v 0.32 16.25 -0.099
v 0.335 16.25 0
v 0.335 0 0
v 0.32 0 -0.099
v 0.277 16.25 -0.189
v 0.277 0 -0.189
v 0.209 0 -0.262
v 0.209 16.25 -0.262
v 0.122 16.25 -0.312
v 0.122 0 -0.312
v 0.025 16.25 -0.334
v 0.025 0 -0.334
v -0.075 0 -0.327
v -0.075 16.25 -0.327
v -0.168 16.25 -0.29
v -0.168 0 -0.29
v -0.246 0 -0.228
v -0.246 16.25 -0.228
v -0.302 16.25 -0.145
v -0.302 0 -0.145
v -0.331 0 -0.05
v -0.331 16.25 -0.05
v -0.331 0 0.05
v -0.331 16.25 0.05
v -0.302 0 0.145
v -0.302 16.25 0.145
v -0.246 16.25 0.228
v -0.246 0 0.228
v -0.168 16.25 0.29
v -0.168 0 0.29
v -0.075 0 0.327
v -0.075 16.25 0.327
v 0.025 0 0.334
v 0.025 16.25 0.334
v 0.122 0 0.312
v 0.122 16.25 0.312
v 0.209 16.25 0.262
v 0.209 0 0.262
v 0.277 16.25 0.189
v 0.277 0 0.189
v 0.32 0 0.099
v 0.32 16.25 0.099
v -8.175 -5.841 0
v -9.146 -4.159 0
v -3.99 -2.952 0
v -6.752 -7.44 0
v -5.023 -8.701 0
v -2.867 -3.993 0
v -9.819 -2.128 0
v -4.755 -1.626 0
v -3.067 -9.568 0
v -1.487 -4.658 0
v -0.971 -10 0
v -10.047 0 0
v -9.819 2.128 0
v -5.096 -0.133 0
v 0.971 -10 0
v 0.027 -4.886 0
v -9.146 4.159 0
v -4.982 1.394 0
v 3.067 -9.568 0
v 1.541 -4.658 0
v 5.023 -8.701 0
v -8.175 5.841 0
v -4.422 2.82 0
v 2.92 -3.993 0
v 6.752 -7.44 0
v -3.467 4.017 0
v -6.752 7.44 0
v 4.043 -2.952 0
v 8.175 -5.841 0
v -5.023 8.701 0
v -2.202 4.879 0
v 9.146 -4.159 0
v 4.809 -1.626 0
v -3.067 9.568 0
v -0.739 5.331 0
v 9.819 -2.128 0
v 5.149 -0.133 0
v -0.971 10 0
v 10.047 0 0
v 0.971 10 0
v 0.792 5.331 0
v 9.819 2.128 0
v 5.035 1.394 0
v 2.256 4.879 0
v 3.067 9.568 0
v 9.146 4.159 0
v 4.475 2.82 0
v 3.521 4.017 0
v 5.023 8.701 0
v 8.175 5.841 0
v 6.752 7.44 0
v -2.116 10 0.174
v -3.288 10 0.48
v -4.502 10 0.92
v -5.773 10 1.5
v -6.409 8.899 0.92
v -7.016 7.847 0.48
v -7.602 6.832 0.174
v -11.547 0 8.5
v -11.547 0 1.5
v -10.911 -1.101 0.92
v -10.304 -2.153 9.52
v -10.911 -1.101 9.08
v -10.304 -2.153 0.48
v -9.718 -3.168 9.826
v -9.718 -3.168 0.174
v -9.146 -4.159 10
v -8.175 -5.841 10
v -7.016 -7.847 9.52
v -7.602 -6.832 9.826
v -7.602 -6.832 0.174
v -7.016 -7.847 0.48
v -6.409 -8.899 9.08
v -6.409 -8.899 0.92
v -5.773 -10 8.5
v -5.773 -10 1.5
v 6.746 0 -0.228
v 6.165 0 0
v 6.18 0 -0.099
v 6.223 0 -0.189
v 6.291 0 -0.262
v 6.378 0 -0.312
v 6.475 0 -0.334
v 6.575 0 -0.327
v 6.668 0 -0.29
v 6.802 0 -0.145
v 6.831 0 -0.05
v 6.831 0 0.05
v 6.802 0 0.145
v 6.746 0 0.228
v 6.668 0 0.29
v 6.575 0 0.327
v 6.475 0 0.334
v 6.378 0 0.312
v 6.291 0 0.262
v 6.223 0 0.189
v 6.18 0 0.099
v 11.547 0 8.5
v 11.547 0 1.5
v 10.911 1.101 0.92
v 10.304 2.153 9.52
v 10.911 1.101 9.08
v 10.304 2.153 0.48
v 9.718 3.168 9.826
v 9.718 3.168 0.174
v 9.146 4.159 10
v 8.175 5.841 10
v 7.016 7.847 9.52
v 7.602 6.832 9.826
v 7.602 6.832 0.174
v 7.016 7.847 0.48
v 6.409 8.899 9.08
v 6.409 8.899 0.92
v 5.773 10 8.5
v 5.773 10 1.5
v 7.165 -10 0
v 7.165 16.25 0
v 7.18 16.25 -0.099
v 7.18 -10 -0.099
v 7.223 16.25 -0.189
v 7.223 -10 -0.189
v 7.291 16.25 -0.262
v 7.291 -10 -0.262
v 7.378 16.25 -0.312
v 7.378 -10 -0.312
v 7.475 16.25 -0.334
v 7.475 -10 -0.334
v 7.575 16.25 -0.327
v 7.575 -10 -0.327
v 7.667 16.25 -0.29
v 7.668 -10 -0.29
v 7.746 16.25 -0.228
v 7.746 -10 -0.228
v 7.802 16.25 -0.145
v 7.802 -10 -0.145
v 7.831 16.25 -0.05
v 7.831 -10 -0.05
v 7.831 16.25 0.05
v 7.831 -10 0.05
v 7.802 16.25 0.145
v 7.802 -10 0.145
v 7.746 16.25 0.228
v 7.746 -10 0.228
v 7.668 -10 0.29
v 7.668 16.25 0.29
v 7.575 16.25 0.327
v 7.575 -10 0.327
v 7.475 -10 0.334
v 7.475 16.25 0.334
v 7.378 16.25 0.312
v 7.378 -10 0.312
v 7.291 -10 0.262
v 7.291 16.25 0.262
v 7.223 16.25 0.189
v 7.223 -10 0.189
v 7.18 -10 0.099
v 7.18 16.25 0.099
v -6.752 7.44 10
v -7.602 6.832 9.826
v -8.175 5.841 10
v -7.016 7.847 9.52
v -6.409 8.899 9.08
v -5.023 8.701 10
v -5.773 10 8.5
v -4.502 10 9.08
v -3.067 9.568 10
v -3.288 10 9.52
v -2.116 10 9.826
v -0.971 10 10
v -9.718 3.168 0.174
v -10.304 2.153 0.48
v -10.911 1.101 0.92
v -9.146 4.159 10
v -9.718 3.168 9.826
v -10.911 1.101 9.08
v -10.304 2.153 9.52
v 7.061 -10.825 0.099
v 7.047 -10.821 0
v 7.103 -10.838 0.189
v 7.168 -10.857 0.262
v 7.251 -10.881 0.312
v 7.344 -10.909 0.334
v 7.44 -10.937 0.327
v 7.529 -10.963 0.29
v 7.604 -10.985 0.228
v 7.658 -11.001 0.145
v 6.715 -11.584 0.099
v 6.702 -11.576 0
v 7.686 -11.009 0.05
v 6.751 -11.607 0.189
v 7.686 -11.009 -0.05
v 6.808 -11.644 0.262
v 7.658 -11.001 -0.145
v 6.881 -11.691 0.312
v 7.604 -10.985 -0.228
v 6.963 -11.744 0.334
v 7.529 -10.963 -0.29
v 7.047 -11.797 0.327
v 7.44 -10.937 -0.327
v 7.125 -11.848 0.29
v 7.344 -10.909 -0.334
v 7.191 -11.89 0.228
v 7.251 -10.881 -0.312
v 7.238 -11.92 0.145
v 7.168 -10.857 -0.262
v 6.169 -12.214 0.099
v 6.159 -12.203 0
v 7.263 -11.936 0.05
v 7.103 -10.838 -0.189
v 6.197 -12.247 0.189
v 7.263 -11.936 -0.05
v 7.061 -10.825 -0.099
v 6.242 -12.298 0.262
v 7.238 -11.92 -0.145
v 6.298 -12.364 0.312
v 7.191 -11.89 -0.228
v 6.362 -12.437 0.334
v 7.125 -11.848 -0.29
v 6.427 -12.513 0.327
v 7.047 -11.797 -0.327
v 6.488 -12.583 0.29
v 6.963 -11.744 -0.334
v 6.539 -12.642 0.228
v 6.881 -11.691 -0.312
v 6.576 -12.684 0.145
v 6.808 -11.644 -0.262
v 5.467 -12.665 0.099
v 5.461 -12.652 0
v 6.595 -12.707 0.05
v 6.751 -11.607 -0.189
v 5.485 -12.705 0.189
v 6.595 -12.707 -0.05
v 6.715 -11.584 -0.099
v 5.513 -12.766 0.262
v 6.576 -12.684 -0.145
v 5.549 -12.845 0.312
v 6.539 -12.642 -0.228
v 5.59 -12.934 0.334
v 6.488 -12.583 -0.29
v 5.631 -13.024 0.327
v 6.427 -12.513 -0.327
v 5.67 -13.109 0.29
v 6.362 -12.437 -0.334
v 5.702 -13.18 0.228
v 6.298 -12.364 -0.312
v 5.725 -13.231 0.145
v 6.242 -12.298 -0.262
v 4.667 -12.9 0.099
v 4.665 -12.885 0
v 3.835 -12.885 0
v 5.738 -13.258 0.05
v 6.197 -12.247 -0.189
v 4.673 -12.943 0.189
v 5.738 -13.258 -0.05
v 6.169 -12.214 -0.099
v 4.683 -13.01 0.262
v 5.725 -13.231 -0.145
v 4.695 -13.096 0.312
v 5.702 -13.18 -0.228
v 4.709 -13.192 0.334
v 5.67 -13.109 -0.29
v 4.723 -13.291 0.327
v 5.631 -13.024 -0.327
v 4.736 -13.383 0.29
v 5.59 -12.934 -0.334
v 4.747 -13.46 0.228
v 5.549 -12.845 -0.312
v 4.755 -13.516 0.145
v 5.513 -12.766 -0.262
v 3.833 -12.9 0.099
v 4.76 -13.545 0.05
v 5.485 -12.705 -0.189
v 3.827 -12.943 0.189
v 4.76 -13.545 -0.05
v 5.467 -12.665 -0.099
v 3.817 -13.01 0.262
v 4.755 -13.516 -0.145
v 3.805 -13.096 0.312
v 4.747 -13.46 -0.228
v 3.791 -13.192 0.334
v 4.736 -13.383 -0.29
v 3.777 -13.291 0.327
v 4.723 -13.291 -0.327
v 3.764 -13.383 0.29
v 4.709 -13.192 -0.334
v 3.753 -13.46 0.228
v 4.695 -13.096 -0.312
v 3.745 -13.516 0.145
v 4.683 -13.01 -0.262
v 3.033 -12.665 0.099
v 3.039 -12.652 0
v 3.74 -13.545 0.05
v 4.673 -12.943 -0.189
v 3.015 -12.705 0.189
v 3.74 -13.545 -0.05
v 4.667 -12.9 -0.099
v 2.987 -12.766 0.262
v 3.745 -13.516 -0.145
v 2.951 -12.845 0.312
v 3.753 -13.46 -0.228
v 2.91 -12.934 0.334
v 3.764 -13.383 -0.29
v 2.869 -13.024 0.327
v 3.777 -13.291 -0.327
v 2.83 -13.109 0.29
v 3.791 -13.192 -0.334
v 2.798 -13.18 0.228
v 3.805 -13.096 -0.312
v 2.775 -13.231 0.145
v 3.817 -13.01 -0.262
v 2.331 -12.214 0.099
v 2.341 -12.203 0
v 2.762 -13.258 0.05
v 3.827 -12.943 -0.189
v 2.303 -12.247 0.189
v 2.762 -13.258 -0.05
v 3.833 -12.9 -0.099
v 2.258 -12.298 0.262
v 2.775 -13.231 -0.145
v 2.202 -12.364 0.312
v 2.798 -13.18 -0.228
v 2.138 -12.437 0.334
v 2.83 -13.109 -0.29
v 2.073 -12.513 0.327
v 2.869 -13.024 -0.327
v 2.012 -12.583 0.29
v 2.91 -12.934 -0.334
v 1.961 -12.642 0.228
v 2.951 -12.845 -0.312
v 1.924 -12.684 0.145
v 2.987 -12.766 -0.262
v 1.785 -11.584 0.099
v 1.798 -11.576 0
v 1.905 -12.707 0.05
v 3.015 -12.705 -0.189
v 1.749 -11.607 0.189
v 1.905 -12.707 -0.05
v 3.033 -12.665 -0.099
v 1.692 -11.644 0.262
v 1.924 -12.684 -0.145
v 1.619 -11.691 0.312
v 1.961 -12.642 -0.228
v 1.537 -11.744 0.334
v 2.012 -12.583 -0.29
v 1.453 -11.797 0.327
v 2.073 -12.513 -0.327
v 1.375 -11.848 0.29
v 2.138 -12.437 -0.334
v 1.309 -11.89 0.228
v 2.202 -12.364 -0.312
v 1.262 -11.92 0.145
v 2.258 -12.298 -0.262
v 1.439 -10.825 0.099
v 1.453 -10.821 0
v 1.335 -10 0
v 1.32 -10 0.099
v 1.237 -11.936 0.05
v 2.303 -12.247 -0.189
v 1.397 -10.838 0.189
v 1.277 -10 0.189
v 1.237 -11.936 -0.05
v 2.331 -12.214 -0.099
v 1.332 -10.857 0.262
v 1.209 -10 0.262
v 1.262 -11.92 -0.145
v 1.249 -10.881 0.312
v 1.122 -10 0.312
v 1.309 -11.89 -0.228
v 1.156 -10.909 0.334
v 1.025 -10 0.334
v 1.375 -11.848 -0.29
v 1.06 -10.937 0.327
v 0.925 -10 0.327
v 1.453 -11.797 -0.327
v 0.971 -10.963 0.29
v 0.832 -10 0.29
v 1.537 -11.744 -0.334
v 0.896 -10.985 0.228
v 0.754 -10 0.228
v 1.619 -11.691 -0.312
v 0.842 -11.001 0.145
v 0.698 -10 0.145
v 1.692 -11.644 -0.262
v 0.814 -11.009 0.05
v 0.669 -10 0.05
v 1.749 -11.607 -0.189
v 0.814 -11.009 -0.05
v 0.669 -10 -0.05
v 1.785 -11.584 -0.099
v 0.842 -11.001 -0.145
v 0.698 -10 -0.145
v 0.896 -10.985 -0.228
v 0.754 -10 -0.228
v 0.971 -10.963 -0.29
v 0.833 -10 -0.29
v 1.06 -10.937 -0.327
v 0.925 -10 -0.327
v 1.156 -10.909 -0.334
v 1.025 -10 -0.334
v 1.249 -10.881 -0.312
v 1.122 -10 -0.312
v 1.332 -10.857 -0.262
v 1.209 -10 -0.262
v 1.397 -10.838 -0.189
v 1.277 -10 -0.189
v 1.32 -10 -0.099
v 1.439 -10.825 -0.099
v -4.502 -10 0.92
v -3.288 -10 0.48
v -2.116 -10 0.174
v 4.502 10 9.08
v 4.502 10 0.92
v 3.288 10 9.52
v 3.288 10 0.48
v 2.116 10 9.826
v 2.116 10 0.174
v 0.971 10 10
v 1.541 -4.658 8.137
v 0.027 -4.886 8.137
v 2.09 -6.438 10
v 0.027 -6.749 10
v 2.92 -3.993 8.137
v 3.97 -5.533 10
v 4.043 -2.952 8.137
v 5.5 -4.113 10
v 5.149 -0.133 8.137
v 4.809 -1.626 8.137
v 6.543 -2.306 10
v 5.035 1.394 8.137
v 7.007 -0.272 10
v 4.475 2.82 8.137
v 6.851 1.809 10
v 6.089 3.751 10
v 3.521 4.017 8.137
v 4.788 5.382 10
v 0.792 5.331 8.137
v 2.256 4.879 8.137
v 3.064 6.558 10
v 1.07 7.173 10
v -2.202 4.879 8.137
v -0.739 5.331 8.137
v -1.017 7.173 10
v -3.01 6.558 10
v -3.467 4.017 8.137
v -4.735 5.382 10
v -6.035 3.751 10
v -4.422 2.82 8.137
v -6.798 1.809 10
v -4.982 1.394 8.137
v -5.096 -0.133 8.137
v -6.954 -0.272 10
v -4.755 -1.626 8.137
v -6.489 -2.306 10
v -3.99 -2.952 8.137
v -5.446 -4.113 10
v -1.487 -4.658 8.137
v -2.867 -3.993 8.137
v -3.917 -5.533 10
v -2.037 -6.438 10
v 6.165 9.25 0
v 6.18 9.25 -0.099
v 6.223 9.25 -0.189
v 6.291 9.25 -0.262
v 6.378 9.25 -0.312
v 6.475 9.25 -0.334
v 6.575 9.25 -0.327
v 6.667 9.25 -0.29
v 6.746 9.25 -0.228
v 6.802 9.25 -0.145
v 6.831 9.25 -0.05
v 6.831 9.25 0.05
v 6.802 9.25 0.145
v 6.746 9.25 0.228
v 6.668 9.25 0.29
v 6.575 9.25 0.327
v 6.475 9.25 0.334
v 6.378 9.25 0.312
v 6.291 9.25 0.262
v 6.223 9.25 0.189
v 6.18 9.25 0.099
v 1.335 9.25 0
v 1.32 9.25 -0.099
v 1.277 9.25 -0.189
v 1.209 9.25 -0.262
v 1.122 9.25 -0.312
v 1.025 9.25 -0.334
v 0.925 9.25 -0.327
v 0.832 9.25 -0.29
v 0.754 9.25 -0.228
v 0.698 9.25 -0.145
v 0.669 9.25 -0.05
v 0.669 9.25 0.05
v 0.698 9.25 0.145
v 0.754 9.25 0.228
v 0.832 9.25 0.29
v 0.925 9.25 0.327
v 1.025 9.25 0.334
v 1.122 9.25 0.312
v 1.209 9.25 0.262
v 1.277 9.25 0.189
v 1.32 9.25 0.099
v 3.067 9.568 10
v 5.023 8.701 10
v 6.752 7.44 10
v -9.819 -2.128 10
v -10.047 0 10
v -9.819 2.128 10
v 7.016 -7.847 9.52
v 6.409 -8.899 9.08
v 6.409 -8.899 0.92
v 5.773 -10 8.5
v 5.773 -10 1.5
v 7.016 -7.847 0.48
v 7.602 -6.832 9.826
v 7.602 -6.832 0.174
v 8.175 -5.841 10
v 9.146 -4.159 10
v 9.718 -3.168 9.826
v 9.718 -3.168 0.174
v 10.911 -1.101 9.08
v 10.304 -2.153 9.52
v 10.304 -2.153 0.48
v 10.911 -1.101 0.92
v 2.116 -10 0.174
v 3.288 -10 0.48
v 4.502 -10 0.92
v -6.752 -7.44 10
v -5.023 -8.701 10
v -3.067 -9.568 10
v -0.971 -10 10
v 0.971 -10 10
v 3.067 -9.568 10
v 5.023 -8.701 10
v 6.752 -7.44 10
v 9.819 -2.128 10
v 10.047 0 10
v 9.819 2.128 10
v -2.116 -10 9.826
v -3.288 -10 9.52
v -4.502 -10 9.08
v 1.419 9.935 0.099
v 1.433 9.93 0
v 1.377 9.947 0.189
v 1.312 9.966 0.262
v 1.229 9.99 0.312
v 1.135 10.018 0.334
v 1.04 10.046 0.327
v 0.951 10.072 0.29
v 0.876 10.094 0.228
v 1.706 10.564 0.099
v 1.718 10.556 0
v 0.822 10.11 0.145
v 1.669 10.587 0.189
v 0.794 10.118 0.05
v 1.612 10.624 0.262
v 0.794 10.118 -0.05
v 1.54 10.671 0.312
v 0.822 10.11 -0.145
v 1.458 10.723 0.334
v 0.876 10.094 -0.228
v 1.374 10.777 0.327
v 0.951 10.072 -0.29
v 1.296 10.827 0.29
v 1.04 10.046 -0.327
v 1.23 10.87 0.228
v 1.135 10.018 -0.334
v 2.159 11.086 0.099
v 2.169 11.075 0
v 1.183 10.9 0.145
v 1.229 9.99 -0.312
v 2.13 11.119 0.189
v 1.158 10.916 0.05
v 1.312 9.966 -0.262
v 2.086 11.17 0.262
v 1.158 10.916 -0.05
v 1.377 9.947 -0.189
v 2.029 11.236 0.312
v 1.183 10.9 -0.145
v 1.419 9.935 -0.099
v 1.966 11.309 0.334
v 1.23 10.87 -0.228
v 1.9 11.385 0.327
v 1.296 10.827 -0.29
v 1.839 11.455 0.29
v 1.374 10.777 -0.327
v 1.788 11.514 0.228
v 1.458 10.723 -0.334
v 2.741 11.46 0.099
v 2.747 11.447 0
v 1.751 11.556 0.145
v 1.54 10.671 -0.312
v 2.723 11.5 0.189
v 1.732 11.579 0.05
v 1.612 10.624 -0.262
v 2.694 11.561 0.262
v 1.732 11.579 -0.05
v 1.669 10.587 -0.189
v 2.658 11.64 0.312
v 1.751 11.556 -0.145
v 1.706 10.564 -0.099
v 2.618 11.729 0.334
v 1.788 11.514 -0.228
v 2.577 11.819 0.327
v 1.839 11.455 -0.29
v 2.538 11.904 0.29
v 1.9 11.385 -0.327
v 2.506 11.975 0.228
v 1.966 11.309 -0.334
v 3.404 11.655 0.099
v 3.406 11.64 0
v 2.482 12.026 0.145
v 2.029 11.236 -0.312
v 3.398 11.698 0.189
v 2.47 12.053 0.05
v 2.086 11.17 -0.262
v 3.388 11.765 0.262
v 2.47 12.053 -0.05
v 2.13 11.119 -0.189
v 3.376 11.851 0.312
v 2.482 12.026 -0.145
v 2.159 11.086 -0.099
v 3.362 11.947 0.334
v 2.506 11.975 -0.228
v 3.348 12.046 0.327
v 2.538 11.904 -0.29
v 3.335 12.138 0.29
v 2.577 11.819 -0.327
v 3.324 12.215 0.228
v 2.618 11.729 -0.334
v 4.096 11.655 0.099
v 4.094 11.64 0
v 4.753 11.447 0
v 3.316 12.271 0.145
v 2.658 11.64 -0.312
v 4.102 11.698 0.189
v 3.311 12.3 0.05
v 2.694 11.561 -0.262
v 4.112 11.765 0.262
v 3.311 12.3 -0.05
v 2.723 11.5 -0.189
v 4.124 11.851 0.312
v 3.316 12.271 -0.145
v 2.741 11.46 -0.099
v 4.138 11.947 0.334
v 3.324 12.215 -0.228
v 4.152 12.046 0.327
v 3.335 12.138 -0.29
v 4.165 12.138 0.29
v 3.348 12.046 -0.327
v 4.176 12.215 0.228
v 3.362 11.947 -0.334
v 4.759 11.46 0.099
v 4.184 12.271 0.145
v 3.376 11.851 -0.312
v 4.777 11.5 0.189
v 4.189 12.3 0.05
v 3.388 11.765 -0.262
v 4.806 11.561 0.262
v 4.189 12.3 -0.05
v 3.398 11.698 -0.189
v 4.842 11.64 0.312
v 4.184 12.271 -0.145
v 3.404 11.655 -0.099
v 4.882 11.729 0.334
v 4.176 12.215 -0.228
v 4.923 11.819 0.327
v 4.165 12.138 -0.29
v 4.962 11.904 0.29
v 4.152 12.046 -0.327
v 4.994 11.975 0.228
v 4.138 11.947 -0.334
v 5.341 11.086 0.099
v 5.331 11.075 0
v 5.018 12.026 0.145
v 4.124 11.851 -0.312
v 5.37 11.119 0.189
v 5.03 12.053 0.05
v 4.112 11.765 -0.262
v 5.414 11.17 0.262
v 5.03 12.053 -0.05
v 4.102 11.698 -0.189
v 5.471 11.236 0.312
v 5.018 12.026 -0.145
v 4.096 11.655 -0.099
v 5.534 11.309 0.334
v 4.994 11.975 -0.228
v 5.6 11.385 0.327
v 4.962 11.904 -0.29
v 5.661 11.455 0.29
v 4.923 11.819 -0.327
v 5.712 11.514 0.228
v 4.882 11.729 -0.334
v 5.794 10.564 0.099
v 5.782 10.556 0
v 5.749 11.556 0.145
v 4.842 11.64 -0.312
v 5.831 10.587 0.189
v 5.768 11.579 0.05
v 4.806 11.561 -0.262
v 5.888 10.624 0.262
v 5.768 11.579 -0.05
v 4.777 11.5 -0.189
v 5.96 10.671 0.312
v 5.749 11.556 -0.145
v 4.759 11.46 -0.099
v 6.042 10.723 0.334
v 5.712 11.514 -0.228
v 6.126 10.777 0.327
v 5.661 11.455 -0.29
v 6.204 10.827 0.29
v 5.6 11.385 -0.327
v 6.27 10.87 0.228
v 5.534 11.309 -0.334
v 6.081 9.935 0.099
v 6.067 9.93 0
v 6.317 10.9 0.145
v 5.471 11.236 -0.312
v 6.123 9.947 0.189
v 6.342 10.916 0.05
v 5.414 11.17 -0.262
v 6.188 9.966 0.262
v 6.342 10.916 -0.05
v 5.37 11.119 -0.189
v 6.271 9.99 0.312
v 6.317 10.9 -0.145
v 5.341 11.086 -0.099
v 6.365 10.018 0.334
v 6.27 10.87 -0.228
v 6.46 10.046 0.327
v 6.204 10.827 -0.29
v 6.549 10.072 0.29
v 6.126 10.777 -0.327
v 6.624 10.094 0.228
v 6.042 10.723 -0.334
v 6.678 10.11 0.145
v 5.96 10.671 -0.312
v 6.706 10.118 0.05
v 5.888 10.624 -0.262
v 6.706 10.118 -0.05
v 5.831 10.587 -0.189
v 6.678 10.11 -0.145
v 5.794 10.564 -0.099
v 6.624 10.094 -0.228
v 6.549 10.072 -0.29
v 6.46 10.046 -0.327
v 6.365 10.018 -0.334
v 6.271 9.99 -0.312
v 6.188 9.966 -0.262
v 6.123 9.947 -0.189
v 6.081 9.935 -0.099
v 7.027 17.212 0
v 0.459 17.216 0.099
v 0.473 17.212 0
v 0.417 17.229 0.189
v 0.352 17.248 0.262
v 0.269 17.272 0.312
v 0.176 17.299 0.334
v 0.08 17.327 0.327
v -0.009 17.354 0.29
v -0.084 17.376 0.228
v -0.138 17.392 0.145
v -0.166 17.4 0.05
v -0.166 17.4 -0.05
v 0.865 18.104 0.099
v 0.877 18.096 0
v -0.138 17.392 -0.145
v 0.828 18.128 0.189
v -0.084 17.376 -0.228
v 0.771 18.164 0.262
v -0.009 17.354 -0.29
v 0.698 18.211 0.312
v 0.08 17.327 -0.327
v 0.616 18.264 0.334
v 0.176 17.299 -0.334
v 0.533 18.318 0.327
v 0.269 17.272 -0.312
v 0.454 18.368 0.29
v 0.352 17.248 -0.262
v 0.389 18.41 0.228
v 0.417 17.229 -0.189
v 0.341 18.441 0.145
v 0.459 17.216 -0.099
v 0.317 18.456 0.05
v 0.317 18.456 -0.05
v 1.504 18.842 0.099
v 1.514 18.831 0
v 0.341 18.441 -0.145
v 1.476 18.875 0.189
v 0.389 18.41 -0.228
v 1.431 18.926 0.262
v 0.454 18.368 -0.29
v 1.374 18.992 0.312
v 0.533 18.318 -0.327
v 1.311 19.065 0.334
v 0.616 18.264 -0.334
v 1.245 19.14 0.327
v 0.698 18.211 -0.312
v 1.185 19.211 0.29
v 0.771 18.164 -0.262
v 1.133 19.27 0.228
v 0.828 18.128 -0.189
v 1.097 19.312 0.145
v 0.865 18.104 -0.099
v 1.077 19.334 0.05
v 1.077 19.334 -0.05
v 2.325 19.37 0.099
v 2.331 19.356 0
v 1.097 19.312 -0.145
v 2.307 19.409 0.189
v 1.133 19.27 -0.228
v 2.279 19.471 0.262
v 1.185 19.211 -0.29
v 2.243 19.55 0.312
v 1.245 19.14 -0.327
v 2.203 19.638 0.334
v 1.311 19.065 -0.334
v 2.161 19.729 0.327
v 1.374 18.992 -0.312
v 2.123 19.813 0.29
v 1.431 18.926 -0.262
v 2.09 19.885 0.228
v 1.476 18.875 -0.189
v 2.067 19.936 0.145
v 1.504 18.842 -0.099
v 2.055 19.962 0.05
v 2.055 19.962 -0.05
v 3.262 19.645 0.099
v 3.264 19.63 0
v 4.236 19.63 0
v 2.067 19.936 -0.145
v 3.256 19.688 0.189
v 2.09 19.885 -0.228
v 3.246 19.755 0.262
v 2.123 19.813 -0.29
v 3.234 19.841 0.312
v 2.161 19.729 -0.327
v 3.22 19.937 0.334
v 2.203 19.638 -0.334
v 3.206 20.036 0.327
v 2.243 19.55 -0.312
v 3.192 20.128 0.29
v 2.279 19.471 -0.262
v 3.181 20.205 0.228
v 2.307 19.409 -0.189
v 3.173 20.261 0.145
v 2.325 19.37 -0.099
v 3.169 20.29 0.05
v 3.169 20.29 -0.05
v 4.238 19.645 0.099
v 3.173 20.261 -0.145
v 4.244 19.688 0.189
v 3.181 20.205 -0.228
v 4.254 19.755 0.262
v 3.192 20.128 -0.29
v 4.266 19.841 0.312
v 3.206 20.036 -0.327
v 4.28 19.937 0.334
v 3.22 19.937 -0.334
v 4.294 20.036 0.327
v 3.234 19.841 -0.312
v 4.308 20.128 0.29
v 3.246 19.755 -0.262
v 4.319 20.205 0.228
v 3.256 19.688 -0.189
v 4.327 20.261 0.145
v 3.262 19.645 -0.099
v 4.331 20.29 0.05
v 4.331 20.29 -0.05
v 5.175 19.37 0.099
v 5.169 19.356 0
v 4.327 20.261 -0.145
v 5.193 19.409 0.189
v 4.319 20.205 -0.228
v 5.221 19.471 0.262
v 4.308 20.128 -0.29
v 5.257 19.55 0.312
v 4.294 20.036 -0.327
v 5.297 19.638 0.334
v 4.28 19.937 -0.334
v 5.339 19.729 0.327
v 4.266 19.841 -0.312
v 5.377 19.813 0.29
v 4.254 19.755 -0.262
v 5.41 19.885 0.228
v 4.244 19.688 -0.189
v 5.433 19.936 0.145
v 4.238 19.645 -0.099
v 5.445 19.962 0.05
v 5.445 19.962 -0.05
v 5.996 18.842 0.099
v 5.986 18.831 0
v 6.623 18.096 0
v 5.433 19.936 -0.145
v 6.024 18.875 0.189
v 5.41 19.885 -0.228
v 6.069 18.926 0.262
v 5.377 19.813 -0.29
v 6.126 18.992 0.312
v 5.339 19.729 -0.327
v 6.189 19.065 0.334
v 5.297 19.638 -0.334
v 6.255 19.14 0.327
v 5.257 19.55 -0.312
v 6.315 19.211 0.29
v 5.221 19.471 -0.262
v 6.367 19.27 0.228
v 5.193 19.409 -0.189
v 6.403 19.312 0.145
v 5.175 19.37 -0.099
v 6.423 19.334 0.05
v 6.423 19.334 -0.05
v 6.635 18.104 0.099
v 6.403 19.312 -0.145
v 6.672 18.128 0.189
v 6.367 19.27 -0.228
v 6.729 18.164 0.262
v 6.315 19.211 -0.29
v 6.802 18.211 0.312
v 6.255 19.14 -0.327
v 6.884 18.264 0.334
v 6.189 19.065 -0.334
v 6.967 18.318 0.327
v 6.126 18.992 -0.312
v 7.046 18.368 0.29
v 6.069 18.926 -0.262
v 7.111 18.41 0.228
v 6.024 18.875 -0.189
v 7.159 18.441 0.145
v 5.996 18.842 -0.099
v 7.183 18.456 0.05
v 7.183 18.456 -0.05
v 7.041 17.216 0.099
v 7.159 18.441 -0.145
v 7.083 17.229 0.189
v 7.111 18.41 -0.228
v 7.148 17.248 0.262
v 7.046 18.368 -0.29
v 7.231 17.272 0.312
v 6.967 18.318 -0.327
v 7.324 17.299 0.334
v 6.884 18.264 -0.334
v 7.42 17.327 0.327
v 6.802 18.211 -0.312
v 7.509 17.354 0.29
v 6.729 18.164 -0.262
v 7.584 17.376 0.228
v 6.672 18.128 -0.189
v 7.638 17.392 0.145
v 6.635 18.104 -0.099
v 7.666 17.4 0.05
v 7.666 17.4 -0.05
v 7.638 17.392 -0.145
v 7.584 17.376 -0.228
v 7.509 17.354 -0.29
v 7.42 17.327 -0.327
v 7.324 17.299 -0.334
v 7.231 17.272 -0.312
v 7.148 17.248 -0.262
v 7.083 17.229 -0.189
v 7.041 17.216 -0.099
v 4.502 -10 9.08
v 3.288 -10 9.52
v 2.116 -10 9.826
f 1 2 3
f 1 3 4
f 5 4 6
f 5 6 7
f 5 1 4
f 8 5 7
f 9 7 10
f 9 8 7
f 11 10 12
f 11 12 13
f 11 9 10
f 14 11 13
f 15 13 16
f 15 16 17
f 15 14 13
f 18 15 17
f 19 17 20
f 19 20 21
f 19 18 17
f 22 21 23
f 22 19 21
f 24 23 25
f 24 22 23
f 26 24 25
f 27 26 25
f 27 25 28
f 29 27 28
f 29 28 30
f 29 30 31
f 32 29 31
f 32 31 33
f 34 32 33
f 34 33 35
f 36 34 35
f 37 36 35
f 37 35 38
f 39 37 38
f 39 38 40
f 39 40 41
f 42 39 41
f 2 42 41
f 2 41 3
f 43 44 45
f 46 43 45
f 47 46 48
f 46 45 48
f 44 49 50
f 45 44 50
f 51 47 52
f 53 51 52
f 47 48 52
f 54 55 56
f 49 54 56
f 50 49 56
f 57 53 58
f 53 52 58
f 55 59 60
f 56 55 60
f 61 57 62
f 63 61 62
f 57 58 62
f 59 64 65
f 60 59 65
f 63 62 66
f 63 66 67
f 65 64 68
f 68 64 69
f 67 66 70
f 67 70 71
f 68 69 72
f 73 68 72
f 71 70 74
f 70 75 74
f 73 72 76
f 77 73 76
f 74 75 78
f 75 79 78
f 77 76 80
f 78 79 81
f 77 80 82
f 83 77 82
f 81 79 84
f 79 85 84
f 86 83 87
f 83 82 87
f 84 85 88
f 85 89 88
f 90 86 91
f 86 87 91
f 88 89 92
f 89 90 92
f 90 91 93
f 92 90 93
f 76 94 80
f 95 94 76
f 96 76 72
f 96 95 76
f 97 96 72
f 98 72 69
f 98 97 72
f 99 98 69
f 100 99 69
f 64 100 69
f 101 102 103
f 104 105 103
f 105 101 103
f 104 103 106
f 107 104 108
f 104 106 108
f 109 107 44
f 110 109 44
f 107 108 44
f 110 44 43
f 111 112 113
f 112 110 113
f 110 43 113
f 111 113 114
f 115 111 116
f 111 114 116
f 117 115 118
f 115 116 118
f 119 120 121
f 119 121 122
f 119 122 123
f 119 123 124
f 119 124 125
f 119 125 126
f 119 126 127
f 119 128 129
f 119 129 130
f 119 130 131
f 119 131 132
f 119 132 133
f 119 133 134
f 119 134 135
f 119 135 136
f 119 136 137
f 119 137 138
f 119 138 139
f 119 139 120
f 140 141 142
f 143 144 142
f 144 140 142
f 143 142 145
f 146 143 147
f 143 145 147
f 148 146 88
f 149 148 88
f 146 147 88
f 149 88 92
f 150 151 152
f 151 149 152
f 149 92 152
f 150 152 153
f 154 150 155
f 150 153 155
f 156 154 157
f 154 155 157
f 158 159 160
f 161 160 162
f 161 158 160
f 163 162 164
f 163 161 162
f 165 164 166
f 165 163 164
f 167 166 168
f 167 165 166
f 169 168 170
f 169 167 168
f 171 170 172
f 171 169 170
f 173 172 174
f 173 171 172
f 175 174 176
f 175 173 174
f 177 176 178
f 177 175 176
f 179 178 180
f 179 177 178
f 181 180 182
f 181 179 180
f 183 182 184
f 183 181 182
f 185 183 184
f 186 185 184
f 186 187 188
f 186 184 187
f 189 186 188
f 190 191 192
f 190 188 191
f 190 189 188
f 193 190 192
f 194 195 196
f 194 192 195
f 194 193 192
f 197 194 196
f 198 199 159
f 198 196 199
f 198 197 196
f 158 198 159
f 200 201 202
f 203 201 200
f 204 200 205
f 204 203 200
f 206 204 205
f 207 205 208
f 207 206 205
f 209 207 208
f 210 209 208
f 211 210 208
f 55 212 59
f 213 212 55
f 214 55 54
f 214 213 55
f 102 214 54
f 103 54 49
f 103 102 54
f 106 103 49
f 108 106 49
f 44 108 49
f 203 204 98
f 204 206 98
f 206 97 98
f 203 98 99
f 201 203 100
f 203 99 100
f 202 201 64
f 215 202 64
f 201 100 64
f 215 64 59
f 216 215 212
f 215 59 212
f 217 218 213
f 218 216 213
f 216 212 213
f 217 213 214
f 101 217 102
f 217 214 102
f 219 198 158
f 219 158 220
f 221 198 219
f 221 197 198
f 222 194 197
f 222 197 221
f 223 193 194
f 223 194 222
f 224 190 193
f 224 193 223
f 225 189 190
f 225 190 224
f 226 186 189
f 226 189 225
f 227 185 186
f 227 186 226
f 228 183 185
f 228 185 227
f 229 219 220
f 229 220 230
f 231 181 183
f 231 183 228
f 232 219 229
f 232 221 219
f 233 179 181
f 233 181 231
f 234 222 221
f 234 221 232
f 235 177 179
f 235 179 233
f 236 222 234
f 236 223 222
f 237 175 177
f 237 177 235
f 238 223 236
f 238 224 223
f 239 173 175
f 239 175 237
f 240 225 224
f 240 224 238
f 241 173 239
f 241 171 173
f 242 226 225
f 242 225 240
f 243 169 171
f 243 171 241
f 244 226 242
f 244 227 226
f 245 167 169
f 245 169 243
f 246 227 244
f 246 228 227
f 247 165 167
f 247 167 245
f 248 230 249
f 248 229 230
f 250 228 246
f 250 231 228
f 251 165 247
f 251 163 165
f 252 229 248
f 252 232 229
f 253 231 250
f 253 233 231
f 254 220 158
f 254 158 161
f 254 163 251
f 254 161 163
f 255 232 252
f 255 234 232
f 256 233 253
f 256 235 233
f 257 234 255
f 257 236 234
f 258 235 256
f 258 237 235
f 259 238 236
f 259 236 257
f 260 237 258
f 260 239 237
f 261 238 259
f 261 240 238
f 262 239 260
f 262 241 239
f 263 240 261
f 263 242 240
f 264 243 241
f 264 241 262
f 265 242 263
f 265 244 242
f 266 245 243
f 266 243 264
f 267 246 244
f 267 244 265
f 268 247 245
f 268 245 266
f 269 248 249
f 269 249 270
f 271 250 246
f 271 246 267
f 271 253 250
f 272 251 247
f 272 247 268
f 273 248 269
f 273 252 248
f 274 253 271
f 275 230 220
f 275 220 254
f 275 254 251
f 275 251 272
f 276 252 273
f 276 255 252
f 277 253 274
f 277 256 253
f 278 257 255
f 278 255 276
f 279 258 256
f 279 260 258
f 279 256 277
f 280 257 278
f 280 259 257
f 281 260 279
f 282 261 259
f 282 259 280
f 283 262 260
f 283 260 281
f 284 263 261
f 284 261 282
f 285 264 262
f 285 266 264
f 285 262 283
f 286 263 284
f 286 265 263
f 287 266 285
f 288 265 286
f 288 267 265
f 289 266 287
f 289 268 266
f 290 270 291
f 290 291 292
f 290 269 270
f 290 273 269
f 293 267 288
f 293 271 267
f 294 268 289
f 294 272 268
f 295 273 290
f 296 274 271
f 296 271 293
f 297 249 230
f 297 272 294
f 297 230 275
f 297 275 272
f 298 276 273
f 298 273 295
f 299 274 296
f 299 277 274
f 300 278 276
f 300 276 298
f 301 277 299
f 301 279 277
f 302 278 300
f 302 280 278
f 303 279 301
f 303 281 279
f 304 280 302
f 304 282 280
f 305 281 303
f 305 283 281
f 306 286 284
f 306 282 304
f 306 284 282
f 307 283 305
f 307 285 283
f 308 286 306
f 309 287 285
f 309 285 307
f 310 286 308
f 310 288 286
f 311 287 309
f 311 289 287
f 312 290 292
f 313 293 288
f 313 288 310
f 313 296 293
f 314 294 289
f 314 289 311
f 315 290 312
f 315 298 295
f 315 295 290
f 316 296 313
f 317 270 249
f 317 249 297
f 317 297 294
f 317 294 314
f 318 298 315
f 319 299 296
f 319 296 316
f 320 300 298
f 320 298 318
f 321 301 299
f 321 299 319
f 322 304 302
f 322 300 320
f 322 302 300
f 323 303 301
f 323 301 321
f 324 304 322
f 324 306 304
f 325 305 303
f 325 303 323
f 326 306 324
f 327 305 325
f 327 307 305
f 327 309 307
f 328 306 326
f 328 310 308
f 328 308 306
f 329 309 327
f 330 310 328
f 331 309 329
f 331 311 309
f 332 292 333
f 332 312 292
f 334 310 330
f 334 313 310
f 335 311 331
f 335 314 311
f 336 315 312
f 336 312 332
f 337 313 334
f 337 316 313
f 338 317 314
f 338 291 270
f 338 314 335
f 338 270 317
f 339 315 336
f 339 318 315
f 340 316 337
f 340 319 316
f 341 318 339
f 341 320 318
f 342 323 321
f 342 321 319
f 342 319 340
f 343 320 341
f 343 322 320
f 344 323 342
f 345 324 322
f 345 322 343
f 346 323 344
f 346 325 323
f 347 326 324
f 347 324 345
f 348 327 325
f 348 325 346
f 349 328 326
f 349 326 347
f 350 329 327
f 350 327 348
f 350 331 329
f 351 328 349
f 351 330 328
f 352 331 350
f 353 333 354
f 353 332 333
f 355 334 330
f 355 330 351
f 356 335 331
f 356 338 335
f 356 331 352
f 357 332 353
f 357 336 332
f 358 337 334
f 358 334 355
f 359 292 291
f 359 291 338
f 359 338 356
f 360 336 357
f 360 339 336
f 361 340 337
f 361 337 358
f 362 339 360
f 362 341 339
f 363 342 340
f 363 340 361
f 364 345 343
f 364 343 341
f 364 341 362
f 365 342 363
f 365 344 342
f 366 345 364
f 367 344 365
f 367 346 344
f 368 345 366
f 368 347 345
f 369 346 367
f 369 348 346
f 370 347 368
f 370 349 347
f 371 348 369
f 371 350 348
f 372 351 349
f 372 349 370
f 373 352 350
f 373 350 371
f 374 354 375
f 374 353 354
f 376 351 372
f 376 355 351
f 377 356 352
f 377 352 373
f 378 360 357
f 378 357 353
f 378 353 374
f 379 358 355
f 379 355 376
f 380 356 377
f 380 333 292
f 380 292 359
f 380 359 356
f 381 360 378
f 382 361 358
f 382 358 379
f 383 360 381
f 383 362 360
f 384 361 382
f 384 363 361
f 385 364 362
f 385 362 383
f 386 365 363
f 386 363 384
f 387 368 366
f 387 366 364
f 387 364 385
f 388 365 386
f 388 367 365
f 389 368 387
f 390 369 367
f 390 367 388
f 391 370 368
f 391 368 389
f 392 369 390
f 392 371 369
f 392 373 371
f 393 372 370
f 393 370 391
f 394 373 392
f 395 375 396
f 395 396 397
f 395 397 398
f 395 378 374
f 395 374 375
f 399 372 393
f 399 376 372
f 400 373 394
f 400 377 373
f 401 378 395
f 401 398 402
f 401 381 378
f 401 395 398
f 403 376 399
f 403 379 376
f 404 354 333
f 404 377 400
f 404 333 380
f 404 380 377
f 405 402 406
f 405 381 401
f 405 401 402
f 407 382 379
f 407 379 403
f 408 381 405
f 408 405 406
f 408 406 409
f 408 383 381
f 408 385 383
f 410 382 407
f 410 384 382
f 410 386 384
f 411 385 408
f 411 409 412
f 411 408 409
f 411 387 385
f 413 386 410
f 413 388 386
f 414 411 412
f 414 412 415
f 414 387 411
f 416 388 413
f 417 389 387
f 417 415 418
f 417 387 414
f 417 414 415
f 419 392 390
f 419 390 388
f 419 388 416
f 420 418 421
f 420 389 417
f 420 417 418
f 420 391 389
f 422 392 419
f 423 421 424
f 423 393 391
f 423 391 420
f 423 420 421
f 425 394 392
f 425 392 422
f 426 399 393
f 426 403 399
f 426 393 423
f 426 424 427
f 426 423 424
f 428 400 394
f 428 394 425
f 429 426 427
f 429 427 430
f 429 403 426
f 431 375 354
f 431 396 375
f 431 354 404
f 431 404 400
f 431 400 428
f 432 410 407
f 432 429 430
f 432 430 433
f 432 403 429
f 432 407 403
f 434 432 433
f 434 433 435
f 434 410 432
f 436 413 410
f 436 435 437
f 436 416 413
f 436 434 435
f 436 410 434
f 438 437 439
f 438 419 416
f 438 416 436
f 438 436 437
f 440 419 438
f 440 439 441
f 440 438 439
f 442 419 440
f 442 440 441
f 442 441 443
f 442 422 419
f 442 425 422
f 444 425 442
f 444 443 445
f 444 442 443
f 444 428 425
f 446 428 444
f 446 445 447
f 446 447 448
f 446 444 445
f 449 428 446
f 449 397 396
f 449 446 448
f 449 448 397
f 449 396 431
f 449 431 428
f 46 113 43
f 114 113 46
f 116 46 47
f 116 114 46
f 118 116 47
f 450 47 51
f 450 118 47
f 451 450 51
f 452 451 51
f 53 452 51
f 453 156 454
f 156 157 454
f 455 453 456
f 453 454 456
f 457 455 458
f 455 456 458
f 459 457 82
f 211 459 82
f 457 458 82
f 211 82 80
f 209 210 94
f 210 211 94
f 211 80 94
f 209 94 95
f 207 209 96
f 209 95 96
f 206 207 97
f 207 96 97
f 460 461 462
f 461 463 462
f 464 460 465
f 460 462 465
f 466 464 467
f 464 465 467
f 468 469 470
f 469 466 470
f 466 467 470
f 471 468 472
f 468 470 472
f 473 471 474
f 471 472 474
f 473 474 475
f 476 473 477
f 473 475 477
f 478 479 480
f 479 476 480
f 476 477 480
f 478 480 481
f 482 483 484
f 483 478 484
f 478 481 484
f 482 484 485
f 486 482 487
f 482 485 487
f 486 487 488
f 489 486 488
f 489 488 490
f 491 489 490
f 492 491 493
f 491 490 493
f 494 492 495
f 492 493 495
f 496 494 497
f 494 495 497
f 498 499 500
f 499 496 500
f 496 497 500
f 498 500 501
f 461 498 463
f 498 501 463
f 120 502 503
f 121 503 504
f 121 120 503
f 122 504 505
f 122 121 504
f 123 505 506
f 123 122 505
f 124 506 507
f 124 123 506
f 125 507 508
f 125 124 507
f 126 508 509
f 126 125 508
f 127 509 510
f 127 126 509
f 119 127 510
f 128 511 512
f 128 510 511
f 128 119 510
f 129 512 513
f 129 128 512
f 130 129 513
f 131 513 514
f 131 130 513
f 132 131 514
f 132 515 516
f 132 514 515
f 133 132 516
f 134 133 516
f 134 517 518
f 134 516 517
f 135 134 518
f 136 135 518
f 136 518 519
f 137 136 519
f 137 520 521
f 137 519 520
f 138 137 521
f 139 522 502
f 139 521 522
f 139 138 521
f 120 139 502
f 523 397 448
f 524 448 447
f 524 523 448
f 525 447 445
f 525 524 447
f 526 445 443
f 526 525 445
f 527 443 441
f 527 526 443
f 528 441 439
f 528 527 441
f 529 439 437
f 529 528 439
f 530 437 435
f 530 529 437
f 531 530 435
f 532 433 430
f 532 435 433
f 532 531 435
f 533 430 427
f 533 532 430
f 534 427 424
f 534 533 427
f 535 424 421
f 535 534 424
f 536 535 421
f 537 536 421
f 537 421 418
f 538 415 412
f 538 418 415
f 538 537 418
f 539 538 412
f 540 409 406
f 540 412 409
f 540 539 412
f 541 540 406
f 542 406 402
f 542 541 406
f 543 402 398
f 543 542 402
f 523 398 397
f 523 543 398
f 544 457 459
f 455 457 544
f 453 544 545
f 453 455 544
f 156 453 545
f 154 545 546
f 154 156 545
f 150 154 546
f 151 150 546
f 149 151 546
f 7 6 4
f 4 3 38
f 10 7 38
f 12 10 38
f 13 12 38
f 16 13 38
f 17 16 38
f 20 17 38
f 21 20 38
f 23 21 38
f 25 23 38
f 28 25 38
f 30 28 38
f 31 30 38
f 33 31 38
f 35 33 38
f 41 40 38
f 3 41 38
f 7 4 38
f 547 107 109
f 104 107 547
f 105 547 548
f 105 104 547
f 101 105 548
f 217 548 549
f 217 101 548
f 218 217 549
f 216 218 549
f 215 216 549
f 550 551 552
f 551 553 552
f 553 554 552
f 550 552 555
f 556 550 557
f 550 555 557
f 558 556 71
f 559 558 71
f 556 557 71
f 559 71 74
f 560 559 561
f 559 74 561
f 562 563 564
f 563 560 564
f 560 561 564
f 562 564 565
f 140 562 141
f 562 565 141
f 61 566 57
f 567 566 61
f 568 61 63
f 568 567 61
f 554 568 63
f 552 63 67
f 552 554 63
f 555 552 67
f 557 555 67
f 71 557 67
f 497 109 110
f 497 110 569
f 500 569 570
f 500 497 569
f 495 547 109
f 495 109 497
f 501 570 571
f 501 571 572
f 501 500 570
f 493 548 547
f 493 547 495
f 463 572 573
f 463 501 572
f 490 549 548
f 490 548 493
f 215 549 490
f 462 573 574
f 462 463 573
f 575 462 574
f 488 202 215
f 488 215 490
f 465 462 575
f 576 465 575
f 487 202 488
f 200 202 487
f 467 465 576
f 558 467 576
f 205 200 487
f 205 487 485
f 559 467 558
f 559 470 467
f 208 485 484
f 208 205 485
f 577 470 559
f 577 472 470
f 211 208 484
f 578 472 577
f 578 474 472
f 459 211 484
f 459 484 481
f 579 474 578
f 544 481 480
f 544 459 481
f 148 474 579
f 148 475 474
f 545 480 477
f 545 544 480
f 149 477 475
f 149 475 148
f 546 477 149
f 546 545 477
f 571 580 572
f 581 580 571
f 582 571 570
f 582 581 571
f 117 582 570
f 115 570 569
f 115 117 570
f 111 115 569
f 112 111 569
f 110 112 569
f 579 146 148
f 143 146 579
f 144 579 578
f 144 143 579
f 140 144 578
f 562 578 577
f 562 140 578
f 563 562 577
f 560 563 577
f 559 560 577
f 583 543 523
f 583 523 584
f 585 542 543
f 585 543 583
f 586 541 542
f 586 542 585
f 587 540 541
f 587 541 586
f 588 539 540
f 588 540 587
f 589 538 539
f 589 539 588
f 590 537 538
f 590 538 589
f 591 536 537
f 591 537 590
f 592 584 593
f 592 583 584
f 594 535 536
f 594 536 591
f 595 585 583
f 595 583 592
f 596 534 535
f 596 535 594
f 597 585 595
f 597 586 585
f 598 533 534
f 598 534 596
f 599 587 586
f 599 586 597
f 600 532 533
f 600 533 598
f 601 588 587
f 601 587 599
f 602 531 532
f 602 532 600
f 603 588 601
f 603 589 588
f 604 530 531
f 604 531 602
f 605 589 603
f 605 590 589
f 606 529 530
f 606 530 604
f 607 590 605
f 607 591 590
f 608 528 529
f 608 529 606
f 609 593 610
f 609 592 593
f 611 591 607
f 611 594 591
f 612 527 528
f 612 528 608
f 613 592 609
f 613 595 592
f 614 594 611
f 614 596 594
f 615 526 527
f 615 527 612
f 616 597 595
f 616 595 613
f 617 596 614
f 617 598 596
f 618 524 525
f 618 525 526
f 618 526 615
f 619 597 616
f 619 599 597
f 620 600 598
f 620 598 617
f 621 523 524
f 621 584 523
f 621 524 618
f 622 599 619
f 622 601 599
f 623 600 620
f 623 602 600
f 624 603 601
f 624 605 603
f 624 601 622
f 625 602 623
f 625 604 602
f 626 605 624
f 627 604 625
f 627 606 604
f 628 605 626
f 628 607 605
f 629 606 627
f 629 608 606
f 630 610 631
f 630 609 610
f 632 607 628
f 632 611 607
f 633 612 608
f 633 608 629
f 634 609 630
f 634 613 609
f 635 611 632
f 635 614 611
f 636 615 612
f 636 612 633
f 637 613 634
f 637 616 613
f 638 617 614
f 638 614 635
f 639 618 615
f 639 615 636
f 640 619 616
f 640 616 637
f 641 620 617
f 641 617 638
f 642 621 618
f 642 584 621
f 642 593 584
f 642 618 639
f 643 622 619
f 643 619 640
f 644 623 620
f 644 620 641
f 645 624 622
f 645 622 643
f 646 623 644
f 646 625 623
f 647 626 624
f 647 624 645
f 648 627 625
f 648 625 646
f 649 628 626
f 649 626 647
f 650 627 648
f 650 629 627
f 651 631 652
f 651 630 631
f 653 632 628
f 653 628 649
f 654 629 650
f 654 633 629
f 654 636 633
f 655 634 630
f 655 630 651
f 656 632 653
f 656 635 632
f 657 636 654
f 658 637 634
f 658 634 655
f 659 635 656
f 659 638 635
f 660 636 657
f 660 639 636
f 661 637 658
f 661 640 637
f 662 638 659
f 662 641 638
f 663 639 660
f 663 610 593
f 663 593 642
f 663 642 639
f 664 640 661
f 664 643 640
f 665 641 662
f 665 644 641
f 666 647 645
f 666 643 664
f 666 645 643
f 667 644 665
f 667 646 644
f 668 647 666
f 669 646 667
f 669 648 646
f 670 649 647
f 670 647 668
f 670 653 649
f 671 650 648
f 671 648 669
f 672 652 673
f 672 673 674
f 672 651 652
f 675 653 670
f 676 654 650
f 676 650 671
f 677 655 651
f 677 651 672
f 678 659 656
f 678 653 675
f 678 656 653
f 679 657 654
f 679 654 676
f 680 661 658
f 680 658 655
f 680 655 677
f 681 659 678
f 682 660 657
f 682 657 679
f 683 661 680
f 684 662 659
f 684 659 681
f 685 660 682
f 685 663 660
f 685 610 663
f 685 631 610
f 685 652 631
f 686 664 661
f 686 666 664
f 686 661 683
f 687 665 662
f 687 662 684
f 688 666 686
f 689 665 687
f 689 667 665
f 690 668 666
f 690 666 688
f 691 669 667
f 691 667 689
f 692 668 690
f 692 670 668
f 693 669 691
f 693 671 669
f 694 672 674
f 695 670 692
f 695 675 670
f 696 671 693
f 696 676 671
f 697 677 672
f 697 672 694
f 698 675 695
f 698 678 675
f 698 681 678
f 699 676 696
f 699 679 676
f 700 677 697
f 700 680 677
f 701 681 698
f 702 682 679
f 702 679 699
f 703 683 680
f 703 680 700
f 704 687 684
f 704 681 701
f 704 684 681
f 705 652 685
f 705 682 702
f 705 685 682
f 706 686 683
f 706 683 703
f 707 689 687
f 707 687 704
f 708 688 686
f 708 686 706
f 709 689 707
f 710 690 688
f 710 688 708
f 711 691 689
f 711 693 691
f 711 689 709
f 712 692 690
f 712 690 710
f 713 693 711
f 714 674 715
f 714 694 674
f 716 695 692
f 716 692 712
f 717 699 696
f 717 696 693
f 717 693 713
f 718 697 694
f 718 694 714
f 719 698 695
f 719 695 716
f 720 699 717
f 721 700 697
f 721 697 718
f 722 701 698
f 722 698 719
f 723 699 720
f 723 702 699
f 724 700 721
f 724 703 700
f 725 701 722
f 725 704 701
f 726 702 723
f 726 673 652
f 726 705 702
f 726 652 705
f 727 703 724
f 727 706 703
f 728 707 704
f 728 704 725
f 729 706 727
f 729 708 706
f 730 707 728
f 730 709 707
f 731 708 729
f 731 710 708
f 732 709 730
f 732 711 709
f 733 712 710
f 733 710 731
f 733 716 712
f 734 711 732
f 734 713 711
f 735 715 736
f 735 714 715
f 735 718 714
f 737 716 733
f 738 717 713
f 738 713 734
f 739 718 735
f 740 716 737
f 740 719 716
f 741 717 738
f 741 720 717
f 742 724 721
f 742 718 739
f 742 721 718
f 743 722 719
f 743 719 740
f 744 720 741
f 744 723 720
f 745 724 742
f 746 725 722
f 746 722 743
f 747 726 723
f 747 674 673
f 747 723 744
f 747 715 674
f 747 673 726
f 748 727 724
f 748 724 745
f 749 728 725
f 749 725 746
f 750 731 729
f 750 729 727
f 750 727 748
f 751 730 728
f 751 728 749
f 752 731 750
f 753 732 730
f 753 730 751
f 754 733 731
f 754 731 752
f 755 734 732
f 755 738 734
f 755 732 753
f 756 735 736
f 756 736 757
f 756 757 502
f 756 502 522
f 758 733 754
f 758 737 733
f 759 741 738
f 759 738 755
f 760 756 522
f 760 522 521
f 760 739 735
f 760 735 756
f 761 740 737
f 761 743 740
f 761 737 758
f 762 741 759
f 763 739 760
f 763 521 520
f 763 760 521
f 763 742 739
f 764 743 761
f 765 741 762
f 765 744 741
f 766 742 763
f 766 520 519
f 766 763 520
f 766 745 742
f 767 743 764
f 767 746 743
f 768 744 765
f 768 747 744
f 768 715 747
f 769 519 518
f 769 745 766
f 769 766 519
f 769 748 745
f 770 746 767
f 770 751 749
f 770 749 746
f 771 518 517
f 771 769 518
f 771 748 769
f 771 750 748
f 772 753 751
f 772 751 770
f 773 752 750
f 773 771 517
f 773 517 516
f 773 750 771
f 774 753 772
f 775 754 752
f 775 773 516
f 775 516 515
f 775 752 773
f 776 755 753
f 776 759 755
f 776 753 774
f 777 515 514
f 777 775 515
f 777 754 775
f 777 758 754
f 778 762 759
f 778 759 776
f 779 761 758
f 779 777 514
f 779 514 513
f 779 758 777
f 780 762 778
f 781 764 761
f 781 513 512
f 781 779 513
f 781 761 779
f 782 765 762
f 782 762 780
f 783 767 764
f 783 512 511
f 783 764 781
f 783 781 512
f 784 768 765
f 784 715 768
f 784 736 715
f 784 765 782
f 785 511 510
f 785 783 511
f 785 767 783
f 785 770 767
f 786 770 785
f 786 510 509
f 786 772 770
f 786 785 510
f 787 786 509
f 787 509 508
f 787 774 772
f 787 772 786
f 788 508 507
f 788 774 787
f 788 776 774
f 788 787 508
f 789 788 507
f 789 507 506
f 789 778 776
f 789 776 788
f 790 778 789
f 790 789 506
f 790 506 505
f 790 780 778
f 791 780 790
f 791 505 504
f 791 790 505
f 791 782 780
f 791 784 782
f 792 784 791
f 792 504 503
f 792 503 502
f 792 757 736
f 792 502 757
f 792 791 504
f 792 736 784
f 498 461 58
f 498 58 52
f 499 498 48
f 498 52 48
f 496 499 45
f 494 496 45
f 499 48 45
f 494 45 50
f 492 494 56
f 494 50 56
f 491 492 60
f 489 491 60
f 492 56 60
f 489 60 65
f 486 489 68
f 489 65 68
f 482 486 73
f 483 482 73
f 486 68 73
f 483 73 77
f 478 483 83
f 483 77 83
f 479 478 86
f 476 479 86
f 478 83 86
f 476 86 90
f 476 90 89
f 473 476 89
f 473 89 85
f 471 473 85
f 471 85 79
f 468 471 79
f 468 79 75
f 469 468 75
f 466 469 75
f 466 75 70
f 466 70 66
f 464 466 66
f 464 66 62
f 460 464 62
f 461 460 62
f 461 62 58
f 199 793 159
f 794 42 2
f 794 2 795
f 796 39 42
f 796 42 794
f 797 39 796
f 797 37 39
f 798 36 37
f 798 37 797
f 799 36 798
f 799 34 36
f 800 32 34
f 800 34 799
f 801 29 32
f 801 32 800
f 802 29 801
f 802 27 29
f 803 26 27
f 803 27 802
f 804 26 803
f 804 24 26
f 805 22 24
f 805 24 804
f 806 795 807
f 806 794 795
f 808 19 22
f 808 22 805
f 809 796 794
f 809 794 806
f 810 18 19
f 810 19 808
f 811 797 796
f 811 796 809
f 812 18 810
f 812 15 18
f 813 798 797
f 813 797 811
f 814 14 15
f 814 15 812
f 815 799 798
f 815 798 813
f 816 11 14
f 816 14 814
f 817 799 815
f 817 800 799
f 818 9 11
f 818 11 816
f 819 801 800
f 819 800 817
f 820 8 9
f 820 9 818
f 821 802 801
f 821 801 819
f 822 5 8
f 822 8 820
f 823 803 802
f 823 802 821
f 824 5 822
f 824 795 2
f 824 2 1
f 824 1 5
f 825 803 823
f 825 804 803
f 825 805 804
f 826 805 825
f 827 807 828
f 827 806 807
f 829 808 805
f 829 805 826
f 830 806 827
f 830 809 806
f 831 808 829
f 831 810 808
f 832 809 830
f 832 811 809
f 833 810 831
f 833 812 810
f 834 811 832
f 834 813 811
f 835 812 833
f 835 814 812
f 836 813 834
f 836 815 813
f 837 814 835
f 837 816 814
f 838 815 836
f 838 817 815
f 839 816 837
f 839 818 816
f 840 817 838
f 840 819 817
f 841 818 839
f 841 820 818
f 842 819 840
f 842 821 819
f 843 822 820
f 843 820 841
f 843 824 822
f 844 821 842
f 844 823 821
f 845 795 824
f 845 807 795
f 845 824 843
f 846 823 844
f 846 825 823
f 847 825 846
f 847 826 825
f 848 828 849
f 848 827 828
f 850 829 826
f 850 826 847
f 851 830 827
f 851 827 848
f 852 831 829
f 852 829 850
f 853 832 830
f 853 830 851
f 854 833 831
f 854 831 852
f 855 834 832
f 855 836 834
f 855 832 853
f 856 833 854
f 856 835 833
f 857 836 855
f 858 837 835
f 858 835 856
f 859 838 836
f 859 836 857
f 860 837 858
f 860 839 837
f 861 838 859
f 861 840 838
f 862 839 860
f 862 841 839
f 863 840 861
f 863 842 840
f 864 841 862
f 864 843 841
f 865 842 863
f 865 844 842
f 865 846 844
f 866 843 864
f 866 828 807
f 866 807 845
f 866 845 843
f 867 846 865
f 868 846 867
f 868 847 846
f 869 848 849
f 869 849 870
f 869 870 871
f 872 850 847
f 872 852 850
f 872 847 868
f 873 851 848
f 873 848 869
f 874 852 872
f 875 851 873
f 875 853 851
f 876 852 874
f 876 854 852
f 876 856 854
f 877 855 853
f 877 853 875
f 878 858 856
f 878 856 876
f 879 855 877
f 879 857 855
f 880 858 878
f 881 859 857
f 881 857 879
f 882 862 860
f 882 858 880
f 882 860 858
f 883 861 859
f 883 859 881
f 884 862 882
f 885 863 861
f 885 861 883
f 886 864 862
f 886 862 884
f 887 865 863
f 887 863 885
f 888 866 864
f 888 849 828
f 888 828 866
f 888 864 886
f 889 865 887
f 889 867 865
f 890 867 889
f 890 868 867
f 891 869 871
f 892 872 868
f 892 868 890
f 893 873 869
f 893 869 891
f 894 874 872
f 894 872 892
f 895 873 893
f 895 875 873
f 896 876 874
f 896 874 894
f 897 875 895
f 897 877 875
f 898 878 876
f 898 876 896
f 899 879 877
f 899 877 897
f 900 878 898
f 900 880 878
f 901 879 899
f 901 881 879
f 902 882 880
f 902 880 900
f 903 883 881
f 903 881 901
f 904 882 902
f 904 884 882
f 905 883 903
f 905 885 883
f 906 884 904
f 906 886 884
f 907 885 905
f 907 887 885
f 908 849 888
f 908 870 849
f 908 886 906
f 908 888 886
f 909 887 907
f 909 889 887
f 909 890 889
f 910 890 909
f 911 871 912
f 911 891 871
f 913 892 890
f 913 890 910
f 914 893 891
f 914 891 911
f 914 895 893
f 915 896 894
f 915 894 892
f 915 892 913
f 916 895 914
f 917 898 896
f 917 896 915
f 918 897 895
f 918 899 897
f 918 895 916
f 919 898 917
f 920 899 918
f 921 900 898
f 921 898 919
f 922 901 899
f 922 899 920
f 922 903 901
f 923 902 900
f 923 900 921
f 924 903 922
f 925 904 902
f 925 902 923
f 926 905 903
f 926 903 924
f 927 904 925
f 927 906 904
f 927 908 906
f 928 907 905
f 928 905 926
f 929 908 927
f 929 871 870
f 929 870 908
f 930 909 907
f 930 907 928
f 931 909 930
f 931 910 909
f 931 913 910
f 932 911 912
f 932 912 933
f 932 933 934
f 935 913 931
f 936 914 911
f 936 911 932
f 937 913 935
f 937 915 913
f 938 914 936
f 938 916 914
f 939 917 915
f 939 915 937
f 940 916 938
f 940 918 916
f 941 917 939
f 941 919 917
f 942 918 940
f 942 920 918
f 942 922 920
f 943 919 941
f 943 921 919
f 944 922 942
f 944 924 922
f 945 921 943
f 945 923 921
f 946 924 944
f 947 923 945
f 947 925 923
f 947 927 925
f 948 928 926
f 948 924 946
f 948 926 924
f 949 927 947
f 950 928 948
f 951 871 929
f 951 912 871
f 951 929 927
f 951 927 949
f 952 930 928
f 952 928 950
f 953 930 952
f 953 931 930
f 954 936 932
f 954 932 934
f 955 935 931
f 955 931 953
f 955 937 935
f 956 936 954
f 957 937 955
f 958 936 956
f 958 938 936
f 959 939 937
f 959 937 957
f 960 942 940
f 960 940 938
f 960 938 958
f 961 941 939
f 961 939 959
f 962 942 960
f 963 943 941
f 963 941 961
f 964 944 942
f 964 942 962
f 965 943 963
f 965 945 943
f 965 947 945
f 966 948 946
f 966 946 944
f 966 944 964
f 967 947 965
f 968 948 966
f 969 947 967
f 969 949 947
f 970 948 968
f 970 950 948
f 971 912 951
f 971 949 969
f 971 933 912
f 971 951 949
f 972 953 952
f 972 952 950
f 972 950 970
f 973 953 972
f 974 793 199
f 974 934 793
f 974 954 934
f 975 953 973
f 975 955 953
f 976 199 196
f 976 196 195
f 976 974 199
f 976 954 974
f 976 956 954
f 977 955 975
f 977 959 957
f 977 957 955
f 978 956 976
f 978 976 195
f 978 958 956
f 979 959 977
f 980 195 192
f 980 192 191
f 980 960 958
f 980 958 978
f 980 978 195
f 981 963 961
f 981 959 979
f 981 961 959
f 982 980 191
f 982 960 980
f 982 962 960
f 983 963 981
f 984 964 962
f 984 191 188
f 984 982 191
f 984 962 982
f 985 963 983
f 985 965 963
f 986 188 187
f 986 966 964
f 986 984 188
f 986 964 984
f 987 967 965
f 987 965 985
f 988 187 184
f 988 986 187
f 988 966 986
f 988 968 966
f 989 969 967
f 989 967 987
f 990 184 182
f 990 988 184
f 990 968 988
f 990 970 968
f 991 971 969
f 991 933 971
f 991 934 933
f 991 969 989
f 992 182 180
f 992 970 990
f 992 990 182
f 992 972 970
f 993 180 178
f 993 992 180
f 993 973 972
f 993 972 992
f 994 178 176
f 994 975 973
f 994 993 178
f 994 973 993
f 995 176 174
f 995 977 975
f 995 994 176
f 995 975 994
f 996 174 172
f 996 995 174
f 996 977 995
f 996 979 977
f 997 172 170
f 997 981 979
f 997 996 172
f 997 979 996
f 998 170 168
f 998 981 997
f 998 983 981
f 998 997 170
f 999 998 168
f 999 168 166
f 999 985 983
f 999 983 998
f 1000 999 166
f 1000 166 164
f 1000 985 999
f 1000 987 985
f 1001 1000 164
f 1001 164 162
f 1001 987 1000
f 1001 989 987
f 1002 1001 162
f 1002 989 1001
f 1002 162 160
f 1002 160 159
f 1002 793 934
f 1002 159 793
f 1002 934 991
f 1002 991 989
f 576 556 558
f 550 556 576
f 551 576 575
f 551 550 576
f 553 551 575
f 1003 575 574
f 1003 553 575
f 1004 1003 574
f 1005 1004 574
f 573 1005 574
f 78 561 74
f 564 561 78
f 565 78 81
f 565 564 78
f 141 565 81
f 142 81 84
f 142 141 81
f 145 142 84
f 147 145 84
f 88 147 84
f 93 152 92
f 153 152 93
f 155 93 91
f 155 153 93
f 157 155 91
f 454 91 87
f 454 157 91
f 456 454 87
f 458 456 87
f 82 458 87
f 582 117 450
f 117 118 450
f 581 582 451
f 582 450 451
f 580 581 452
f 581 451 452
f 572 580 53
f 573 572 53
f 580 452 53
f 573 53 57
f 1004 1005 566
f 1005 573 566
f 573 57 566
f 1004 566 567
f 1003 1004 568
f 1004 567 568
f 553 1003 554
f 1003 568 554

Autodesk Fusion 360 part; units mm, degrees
sketch "Hex Polygon" plane through (0, 0, 0) normal (0, 0, 1) x (1, 0, 0) in component "Hex Nut"
  line L0 (5.7735, 10) -> (-5.7735, 10)
  line L1 (-5.7735, 10) -> (-11.547, 0)
  line L2 (-11.547, 0) -> (-5.7735, -10)
  line L3 (-5.7735, -10) -> (5.7735, -10)
  line L4 (5.7735, -10) -> (11.547, 0)
  line L5 (11.547, 0) -> (5.7735, 10)
  dimension "d1" = 10
extrude "Extrude1" add sketch "Hex Polygon" along normal blind 10 in component "Hex Nut"
sketch "Chamfer Cutout" plane through (0, 0, 0) normal (0, 1, 0) x (1, 0, 0) in component "Hex Nut"
  line L0 (11.547, -10) -> (10.047, -10)
  line L1 (10.047, -10) -> (11.547, -8.5)
  line L2 (11.547, -8.5) -> (11.547, -10)
  point P0 (11.547, -10)
  dimension "d4" = 1.5
revolve "Revolve1" cut sketch "Chamfer Cutout" angle 360 about axis through (0, 0, 1.75) along (0, 0, 1) in component "Hex Nut"
hole "Hole1" at (0.0267, 0.251, 10) direction (0, 0, -1) diameter 10.274 end through all countersink diameter 14 countersink angle 90 in component "Hex Nut"
ref_plane "WorkPlane1" through (0, 0, 5) normal (0, 0, 1) x (1, 0, 0) in component "Hex Nut"
mirror "Mirror1" about plane through (0, 0, 5) normal (0, 0, 1) of "Revolve1" in component "Hex Nut"
component "Hex Nut" placed x (1, 0, 0) y (0, 1, 0) z (0, 0, 1) at (0, 0, 0)

Autodesk Fusion 360 part; units mm, degrees
sketch "Sweep Path" plane through (0, 0, 0) normal (0, 0, 1) x (1, 0, 0) in component "Paperclip"
  line L0 (0, 0) -> (0, 16.25)
  line L1 (0, 16.25) -> (7.5, 16.25) construction
  line L2 (7.5, 16.25) -> (7.5, -10)
  line L3 (7.5, -10) -> (1, -10) construction
  line L4 (1, -10) -> (1, 9.25)
  line L5 (1, 9.25) -> (6.5, 9.25) construction
  line L6 (6.5, 9.25) -> (6.5, 0)
  arc A0 (7.5, 16.25) -> (0, 16.25) centre (3.75, 16.25) ccw
  arc A1 (6.5, 9.25) -> (1, 9.25) centre (3.75, 9.25) ccw
  arc A2 (1, -10) -> (7.5, -10) centre (4.25, -10) ccw
  dimension "d1" = 16.25
  dimension "d2" = 7.5
  dimension "d3" = 26.25
  dimension "d4" = 6.5
  dimension "d5" = 19.25
  dimension "d6" = 5.5
  dimension "d7" = 9.25
sketch "Sketch2" plane through (0, 0, 0) normal (0, 1, 0) x (1, 0, 0) in component "Paperclip"
  circle A0 centre (0, 0) radius 0.335
  dimension "d8" = 0.67
sweep "Sweep1" add profiles "Sketch2" path "Sweep Path" along L0 A0 L2 A2 L4 A1 L6 section 1 in component "Paperclip"
component "Paperclip" placed x (1, 0, 0) y (0, 1, 0) z (0, 0, 1) at (0, 0, 0)
